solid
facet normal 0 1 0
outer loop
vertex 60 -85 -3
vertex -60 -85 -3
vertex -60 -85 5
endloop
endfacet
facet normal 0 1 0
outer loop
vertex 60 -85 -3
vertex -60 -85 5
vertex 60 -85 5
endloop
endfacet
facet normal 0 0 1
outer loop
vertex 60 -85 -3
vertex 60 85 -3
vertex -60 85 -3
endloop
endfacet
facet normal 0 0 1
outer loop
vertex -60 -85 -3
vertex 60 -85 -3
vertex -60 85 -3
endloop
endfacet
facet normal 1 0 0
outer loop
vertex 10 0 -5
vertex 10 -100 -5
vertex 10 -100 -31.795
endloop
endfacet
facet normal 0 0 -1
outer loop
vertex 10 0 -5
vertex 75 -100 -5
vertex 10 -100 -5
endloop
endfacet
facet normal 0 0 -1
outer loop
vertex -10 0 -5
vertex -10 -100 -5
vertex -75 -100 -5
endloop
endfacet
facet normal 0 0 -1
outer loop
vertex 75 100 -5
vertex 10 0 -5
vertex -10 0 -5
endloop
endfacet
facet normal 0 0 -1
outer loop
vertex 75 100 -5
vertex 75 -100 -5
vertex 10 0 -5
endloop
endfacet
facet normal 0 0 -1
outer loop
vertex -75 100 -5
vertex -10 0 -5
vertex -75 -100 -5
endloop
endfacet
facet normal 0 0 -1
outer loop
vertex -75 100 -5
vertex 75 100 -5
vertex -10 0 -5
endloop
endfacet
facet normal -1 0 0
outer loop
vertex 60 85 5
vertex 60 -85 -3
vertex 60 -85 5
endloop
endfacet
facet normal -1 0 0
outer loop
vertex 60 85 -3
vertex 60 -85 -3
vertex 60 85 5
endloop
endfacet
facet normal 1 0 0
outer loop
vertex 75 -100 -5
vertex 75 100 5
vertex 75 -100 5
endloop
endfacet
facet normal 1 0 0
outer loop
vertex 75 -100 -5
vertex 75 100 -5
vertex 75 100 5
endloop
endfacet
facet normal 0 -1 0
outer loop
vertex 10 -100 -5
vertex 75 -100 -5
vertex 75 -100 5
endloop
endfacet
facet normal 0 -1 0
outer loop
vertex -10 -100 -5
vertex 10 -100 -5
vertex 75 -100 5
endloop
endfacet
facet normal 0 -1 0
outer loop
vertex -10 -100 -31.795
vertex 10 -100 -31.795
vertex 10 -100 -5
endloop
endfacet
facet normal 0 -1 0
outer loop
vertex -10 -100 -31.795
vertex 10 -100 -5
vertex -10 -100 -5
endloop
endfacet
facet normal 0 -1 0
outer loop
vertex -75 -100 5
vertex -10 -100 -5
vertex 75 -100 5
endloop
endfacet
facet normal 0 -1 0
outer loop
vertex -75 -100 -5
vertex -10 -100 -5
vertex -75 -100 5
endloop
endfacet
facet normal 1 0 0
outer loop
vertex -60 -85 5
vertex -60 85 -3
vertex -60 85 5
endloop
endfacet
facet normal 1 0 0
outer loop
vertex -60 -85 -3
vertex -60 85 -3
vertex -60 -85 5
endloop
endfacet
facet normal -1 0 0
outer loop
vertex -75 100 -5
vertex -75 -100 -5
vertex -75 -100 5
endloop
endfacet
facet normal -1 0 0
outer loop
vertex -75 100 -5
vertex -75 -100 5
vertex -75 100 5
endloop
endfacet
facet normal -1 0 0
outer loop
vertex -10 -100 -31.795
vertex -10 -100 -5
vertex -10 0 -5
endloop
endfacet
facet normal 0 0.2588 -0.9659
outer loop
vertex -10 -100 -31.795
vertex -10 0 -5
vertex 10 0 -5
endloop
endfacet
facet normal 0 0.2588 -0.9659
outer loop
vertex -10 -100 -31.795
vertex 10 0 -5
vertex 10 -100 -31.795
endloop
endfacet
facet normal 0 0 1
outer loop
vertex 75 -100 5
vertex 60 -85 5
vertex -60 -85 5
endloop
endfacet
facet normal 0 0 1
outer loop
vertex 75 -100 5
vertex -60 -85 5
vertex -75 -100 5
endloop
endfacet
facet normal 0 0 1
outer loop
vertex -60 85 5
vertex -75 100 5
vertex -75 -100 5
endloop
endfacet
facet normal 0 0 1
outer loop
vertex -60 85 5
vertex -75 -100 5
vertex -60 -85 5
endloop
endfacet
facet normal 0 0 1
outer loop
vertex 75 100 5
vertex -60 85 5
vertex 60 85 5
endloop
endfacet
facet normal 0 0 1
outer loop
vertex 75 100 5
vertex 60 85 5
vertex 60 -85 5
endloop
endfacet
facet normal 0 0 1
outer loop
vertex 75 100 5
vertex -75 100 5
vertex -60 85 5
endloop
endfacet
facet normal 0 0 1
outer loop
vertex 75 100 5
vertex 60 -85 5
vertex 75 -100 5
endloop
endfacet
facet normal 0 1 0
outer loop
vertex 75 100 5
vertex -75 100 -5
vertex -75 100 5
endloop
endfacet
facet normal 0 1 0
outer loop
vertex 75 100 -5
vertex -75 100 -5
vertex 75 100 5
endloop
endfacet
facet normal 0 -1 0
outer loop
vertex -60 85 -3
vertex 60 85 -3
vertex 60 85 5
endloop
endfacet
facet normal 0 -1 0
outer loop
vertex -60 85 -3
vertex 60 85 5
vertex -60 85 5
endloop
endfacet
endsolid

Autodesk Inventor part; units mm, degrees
ref_plane "YZ Plane" through (0, 0, 0) normal (1, 0, 0) x (0, 1, 0)
ref_plane "XZ Plane" through (0, 0, 0) normal (0, 1, 0) x (-1, 0, 0)
ref_plane "XY Plane" through (0, 0, 0) normal (0, 0, 1) x (1, 0, 0)
sketch "Эскиз3" plane through (0, 0, 0) normal (0, 0, 1) x (1, 0, 0)
  line L0 (75, -100) -> (-75, -100)
  line L1 (-75, -100) -> (-75, 100)
  line L2 (-75, 100) -> (75, 100)
  line L3 (75, 100) -> (75, -100)
  line L4 (75, -100) -> (-75, 100) construction
  line L5 (-75, -100) -> (75, 100) construction
  line L6 (-60, 85) -> (-60, -85)
  line L7 (-60, -85) -> (60, -85)
  line L8 (60, -85) -> (60, 85)
  line L9 (60, 85) -> (-60, 85)
  point P0 (0, 0)
  dimension "d11" = 150
  dimension "d12" = 200
  dimension "d13" = 15
extrude "Толщина рамки" add sketch "Эскиз3" along normal mid plane 10
sketch "Эскиз5" plane through (0, 0, 0) normal (1, 0, 0) x (0, 1, 0)
  line L0 (-100, -5) -> (100, -5) projected
  line L1 (0, -5) -> (-100, -31.7949)
  line L2 (-100, -31.7949) -> (-100, -5)
  line L3 (85, -5) -> (-85, -5) projected
  point P0 (0, 0)
  dimension "d16" = 15
  dimension "d24" = 100
extrude "Толищна подставки" add sketch "Эскиз5" along normal mid plane 20
sketch "Эскиз11" plane through (0, 0, -5) normal (0, 0, -1) x (-1, 0, 0)
  line L0 (-60, 85) -> (60, 85) projected
  line L1 (60, 85) -> (60, -85) projected
  line L2 (60, -85) -> (10, -85) projected
  line L3 (-10, -85) -> (-60, -85) projected
  line L4 (-60, -85) -> (-60, 85) projected
  line L5 (10, -85) -> (-10, -85) projected
  point P0 (0, 0)
extrude "Толщина зад. стенки" add sketch "Эскиз11" against normal blind 2
properties part number "project1"
